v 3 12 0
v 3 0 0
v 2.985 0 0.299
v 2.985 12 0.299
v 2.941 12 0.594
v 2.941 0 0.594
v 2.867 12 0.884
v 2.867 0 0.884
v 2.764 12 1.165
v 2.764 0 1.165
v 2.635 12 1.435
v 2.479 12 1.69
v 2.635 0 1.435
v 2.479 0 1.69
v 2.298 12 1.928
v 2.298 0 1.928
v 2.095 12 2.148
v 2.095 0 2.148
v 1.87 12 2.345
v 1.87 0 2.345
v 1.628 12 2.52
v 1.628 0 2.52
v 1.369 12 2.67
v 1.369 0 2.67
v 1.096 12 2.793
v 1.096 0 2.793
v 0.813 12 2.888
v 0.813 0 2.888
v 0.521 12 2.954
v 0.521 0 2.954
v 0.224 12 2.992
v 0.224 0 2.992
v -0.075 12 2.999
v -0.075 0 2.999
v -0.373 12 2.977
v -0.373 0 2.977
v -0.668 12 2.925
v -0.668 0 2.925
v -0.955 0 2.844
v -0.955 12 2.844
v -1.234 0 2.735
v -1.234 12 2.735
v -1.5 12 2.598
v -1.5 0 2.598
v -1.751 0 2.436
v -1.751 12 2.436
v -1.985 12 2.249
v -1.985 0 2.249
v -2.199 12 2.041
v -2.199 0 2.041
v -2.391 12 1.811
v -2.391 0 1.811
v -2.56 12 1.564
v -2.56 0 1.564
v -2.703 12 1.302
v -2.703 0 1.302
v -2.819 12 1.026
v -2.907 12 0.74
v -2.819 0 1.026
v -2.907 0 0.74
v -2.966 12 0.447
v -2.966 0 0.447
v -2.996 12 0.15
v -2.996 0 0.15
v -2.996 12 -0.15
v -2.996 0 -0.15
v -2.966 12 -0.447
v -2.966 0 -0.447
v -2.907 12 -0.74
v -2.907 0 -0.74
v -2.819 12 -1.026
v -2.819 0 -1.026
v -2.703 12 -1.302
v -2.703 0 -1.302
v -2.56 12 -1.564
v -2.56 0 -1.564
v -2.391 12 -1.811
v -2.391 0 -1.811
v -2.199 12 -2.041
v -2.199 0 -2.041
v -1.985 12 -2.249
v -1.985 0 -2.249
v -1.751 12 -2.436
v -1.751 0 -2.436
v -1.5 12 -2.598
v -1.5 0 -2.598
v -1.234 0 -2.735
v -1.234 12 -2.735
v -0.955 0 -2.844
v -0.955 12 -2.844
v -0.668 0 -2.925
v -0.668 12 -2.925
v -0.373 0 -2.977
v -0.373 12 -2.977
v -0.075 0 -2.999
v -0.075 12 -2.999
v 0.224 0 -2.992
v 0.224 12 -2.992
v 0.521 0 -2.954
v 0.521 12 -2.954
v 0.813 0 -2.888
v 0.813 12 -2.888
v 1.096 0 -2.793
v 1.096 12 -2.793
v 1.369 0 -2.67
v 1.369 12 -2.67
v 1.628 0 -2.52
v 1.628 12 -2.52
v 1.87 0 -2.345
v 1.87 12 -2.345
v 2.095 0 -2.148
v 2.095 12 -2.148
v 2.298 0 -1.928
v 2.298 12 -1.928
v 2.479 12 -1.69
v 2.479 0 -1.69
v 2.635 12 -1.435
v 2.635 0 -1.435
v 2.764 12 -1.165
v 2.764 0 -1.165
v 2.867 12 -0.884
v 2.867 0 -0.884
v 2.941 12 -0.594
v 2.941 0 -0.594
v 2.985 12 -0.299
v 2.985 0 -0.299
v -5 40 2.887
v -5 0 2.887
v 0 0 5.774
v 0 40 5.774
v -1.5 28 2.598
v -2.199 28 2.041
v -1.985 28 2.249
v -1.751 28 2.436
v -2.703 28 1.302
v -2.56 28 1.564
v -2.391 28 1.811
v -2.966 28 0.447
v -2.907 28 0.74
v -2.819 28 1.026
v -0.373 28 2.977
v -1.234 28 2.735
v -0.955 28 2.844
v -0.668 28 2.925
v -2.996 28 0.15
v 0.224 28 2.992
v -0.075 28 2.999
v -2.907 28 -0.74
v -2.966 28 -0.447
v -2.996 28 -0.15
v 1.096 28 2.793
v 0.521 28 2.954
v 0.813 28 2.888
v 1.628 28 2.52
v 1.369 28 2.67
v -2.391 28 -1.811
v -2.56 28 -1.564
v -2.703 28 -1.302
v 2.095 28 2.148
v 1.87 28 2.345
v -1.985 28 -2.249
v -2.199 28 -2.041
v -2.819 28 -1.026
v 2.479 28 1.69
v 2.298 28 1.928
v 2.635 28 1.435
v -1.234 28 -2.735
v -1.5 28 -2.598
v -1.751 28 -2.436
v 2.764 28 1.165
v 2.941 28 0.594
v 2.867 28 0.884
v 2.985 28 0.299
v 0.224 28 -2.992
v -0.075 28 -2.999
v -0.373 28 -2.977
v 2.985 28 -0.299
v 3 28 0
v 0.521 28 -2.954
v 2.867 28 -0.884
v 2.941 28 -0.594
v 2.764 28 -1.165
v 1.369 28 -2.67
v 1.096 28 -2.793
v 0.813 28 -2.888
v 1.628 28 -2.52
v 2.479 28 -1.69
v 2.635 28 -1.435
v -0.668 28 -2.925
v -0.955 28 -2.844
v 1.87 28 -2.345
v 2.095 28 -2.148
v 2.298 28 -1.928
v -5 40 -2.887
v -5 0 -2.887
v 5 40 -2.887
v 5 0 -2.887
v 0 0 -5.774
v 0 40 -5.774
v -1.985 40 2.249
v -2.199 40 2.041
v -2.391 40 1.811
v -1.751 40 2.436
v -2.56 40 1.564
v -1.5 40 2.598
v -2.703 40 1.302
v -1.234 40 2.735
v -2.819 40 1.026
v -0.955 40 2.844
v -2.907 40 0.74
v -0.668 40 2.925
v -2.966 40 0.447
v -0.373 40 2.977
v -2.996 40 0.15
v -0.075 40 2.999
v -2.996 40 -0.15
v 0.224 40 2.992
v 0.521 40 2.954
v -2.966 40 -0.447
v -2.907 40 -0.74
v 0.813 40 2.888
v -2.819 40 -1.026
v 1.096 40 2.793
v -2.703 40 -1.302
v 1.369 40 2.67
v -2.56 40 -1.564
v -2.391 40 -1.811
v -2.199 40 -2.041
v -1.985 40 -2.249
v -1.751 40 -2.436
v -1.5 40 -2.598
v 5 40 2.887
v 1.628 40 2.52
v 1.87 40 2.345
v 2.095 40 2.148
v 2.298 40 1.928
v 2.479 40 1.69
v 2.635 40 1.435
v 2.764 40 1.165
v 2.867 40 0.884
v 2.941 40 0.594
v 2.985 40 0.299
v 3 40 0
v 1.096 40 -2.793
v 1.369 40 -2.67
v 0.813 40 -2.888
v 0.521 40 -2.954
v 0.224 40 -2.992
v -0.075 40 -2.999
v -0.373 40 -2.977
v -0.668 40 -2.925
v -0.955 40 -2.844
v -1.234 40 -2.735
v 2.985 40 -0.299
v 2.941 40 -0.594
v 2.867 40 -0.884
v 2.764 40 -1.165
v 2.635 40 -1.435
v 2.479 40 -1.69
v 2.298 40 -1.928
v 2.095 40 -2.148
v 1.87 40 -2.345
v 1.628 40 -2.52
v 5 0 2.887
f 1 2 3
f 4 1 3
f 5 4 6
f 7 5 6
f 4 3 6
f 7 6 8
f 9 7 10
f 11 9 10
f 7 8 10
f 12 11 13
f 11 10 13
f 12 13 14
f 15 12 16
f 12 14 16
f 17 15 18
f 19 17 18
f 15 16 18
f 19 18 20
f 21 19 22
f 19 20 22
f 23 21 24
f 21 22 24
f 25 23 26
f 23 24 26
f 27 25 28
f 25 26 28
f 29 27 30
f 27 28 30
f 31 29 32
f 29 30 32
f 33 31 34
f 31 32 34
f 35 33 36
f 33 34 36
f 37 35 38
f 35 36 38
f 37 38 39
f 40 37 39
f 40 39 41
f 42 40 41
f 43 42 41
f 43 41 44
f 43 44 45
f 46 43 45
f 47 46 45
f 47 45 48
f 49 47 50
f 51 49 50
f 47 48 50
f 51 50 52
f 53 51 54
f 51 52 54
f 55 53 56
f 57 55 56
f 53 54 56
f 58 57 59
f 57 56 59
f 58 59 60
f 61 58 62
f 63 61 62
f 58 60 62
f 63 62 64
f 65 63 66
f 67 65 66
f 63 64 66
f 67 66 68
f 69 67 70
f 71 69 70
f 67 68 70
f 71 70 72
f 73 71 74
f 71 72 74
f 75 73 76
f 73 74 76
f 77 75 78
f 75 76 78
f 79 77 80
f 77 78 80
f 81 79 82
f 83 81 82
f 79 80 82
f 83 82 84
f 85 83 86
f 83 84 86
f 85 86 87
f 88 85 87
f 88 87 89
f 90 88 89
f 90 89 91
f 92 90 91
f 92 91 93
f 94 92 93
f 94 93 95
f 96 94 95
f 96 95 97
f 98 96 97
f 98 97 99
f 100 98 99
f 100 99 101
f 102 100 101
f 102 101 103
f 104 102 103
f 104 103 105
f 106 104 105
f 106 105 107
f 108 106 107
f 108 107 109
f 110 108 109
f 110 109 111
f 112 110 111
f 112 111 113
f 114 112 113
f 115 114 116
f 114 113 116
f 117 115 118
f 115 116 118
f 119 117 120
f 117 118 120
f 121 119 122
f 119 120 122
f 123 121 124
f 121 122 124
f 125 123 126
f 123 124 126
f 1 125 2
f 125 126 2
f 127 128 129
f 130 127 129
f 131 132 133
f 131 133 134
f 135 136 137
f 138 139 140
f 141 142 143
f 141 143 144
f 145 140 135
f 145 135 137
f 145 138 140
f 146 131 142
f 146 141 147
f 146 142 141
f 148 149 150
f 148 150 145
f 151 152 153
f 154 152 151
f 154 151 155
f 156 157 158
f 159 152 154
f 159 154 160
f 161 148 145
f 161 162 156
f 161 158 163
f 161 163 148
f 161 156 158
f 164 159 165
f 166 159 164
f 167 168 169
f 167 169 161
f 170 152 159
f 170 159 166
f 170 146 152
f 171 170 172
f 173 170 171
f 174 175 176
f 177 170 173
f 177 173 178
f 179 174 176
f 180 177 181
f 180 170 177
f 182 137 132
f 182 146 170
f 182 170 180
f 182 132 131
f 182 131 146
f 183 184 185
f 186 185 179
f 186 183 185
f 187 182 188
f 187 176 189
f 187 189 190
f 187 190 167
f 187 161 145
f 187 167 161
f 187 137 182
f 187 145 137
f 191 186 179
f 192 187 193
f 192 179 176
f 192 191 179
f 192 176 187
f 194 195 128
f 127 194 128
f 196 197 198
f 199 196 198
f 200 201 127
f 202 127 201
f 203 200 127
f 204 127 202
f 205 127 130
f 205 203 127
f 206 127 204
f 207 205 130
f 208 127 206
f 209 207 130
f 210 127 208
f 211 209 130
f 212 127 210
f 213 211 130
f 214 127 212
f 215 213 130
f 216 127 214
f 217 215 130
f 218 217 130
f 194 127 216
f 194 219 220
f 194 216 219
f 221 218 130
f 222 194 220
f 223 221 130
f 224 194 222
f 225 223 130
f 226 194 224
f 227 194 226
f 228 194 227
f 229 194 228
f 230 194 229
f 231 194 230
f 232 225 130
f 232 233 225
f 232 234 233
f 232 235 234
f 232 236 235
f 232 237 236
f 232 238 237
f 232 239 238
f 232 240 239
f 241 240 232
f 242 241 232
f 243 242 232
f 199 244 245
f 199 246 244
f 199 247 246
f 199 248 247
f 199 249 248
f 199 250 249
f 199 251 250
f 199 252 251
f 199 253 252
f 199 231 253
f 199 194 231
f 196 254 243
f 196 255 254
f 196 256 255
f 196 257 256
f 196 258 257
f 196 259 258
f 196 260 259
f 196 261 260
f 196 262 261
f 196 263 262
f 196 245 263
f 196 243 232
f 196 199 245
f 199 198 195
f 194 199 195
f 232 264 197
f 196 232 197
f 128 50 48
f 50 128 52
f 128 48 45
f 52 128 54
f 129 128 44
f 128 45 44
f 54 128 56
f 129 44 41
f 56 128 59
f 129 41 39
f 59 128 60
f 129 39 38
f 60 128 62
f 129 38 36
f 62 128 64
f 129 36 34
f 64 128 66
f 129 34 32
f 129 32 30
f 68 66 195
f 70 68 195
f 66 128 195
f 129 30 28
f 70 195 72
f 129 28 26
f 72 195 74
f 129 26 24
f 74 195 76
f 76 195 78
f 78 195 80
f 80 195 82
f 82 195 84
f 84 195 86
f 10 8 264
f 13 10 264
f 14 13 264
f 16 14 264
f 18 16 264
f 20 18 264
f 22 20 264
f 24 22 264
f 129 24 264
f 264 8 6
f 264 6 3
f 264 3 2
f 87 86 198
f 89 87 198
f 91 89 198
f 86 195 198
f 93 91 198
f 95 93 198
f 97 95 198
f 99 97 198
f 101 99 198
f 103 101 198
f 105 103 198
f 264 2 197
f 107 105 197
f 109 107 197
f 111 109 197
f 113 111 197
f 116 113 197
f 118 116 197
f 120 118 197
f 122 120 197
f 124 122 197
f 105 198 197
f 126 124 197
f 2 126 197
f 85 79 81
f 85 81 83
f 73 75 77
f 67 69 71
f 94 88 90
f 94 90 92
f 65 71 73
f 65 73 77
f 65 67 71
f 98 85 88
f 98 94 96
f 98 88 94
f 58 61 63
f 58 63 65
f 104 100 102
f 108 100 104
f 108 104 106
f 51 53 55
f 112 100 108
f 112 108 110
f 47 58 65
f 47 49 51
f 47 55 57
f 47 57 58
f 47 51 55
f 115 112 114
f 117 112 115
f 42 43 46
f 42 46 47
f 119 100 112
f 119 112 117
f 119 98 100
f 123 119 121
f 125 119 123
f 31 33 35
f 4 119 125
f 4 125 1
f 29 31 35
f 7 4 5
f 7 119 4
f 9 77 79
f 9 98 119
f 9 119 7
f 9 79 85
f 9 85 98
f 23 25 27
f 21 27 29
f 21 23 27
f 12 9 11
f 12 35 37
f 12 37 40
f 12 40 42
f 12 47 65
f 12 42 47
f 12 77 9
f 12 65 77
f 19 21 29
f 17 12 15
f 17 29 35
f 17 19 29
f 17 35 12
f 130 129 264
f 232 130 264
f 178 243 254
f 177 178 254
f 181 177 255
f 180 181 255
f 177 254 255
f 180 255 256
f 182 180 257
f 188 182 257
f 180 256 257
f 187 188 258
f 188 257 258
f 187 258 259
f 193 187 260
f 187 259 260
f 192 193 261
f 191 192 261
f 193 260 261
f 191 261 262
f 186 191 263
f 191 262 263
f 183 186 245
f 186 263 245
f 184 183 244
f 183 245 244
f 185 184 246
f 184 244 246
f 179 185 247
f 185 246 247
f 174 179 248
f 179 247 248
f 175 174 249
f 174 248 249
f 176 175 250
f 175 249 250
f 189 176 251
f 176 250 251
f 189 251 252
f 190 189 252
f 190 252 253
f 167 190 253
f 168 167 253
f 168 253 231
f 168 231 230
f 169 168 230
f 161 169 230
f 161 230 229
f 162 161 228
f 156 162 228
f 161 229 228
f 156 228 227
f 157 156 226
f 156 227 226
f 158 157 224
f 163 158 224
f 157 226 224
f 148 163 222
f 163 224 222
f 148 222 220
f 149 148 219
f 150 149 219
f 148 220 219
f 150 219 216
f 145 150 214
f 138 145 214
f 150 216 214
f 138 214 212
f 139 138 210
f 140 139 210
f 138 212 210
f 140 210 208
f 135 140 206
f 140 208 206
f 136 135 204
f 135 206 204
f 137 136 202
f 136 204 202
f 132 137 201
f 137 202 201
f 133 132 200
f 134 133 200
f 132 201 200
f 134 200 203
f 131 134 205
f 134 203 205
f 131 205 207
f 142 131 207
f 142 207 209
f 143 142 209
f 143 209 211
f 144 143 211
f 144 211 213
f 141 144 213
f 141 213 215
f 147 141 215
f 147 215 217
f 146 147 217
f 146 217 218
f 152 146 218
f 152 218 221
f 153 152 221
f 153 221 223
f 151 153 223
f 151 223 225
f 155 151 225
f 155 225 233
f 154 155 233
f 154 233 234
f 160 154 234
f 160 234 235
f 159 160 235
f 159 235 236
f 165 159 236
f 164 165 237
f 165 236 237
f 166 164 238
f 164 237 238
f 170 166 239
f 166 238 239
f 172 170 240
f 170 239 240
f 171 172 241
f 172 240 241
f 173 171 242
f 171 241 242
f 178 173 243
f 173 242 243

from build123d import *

# Parameters (mm, degrees)
BOSS_EXTRUDE1_DEPTH = 40
SKETCH3_R           = 3
CUT_EXTRUDE1_DEPTH  = 12
SKETCH4_R           = 3
CUT_EXTRUDE2_DEPTH  = 12


with BuildPart() as part:
    # Sketch1 → Boss-Extrude1 (new body)
    with BuildSketch(Plane(origin=(0, 0, 0), x_dir=(1, 0, 0), z_dir=(0, 1, 0))):
        Polygon((0, -5.773502692), (5, -2.886751346), (5, 2.886751346), (0, 5.773502692), (-5, 2.886751346), (-5, -2.886751346), align=None)
    extrude(amount=BOSS_EXTRUDE1_DEPTH)

    # Sketch3 → Cut-Extrude1 (cut)
    with BuildSketch(Plane.XZ):
        Circle(SKETCH3_R)
    extrude(amount=-CUT_EXTRUDE1_DEPTH, mode=Mode.SUBTRACT)

    # Sketch4 → Cut-Extrude2 (cut)
    with BuildSketch(Plane(origin=(0, 40, 0), x_dir=(1, 0, 0), z_dir=(0, 1, 0))):
        Circle(SKETCH4_R)
    extrude(amount=-CUT_EXTRUDE2_DEPTH, mode=Mode.SUBTRACT)


solid = part.part
